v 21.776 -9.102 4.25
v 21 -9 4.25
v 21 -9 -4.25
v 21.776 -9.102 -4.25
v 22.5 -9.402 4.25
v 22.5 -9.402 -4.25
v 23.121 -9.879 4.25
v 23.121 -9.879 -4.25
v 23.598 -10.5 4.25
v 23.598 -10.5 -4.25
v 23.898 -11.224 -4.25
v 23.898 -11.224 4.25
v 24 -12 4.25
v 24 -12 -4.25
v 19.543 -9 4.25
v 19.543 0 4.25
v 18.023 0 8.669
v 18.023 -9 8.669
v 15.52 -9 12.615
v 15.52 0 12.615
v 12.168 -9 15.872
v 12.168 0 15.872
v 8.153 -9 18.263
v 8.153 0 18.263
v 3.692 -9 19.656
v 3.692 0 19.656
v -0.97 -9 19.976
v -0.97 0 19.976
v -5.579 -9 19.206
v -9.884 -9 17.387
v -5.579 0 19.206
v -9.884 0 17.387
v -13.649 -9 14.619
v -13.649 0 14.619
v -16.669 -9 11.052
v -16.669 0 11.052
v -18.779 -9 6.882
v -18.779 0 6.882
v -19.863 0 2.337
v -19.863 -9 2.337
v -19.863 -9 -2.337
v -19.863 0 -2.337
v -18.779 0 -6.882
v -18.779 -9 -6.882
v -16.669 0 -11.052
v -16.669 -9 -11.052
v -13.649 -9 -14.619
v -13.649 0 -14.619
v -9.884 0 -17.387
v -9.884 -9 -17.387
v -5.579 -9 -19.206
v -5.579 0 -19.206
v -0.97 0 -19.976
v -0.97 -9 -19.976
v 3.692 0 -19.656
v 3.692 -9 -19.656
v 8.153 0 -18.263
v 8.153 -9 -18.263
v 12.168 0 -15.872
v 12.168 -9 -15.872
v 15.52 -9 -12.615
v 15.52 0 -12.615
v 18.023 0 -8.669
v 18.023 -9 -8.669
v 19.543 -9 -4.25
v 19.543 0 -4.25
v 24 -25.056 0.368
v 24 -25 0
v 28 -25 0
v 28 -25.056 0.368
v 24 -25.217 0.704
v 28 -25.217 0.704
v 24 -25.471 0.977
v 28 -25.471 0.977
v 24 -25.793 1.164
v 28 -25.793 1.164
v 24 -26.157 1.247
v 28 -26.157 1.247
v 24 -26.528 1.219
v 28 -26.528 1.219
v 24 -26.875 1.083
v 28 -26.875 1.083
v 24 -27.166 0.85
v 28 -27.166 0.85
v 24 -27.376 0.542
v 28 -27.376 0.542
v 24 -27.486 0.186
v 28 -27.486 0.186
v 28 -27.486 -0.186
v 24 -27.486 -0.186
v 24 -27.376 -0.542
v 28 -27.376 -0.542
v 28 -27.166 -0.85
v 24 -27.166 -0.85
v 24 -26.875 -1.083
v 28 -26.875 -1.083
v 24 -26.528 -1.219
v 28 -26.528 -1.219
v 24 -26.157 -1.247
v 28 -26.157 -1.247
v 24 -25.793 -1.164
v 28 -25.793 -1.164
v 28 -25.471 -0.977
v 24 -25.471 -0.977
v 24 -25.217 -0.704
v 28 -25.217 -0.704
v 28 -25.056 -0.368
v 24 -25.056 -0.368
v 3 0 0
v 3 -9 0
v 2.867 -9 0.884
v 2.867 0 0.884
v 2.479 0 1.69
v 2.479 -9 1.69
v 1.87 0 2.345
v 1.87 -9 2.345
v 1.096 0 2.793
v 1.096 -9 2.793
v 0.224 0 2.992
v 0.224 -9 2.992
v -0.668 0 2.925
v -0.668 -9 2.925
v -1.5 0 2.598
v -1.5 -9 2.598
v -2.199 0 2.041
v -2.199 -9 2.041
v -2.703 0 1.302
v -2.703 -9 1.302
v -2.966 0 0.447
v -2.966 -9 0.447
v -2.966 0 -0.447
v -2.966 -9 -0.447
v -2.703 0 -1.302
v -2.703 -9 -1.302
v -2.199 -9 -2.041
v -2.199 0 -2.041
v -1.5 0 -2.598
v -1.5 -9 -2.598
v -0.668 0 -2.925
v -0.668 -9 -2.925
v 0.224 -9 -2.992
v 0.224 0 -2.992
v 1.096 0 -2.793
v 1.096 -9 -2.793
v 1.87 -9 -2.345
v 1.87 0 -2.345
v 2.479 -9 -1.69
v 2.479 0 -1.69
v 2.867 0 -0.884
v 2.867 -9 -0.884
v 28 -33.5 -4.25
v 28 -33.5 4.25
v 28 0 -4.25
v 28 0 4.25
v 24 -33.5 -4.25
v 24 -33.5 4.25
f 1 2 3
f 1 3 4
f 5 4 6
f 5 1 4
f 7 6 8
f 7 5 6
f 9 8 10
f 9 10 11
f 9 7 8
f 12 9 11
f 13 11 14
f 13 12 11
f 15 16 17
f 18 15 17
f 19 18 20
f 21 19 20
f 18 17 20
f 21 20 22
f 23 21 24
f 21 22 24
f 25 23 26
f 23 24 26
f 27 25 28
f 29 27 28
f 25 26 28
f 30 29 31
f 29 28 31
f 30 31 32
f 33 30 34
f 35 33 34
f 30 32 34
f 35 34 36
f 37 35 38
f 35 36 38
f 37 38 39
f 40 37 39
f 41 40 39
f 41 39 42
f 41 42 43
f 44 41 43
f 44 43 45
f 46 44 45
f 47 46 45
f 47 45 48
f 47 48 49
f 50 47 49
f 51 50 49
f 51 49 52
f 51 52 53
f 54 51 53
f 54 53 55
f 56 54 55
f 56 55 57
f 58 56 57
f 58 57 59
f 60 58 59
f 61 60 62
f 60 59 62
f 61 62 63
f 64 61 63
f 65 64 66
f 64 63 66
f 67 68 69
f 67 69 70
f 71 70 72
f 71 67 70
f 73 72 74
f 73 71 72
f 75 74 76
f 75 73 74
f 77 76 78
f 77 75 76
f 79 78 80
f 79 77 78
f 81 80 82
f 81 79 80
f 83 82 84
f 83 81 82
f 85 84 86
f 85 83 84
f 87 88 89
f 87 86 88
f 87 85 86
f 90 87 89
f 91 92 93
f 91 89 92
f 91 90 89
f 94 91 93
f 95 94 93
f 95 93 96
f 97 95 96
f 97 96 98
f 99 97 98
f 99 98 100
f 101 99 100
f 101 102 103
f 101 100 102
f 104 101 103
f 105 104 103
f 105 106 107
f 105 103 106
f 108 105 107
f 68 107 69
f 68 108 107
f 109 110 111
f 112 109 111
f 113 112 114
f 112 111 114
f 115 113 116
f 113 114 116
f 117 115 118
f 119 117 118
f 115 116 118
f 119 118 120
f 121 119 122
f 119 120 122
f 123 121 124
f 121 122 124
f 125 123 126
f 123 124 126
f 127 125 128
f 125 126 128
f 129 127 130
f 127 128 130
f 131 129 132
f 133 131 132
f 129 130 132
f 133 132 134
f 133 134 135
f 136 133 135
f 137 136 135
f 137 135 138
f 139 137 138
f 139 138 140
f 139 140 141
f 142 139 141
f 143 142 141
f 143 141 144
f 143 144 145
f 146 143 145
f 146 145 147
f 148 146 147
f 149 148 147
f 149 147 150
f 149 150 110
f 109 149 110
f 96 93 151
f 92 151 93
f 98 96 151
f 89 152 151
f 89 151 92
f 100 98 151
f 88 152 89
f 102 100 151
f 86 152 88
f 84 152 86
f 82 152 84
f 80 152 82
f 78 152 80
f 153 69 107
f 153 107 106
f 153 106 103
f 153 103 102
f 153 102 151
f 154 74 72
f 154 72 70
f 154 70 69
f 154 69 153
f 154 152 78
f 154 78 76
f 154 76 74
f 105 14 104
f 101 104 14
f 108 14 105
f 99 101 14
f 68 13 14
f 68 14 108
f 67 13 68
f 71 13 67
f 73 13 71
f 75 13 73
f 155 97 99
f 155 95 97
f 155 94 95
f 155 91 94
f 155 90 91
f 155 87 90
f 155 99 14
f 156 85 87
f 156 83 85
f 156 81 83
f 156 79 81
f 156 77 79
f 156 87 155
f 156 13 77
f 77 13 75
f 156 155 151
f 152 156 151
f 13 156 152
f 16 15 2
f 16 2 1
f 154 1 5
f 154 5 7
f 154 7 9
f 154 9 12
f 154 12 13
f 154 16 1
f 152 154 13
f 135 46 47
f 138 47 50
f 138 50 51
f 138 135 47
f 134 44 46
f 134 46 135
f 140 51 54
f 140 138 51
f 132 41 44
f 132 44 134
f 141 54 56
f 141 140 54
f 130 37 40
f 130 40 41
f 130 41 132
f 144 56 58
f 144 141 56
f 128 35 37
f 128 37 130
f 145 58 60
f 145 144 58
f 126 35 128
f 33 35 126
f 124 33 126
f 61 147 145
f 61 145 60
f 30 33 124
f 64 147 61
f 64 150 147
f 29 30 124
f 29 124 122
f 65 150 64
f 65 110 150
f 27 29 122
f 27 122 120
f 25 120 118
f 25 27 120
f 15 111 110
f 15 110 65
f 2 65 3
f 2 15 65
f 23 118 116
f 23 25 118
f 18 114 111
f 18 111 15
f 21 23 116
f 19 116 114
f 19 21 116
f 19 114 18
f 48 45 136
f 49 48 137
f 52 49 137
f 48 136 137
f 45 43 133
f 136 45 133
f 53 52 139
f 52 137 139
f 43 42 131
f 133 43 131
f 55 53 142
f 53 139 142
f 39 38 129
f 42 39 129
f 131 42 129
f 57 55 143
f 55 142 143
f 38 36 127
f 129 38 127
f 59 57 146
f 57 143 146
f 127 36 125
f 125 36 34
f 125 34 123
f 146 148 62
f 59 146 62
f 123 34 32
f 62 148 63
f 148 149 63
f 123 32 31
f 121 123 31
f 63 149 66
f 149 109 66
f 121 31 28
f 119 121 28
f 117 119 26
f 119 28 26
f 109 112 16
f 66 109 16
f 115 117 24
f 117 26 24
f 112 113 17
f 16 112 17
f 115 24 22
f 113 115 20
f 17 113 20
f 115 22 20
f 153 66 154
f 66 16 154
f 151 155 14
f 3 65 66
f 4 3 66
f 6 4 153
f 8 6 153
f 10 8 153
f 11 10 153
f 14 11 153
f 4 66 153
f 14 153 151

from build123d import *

# Parameters (mm, degrees)
F0_R     = 20
F1_DEPTH = 9
F2_R     = 3
F3_DEPTH = 9.001
F5_DEPTH = 4.25
F6_R     = 1.25
F7_DEPTH = 28.001


with BuildPart() as f1:
    # F0 (on Front) → F1 (new body)
    with BuildSketch(Plane.XZ):
        Circle(F0_R)
    extrude(amount=F1_DEPTH)

    # F2 (on face) → F3 (cut, through all)
    with BuildSketch(Plane.XZ.offset(9)):
        Circle(F2_R)
    extrude(amount=-F3_DEPTH, mode=Mode.SUBTRACT)

    # F4 (on Top) → F5 (join, symmetric)
    with BuildSketch(Plane.XY):
        with BuildLine():
            Line((15.483786, -9), (20, -9))
            Line((20, -9), (21, -9))
            ThreePointArc((21, -9), (23.12132, -9.87868), (24, -12))
            Line((24, -12), (24, -33.5))
            Line((24, -33.5), (28, -33.5))
            Line((28, -33.5), (28, -9))
            Line((28, -9), (28, 0))
            Line((28, 0), (20, 0))
            Line((20, 0), (15.483786, 0))
            Line((15.483786, 0), (15.483786, -9))
        make_face()
    extrude(amount=F5_DEPTH, both=True)

    # F6 (on Right) → F7 (cut, through all)
    with BuildSketch(Plane.YZ):
        with Locations((-26.25, 0)):
            Circle(F6_R)
    extrude(amount=F7_DEPTH, mode=Mode.SUBTRACT)


solid = f1.part
